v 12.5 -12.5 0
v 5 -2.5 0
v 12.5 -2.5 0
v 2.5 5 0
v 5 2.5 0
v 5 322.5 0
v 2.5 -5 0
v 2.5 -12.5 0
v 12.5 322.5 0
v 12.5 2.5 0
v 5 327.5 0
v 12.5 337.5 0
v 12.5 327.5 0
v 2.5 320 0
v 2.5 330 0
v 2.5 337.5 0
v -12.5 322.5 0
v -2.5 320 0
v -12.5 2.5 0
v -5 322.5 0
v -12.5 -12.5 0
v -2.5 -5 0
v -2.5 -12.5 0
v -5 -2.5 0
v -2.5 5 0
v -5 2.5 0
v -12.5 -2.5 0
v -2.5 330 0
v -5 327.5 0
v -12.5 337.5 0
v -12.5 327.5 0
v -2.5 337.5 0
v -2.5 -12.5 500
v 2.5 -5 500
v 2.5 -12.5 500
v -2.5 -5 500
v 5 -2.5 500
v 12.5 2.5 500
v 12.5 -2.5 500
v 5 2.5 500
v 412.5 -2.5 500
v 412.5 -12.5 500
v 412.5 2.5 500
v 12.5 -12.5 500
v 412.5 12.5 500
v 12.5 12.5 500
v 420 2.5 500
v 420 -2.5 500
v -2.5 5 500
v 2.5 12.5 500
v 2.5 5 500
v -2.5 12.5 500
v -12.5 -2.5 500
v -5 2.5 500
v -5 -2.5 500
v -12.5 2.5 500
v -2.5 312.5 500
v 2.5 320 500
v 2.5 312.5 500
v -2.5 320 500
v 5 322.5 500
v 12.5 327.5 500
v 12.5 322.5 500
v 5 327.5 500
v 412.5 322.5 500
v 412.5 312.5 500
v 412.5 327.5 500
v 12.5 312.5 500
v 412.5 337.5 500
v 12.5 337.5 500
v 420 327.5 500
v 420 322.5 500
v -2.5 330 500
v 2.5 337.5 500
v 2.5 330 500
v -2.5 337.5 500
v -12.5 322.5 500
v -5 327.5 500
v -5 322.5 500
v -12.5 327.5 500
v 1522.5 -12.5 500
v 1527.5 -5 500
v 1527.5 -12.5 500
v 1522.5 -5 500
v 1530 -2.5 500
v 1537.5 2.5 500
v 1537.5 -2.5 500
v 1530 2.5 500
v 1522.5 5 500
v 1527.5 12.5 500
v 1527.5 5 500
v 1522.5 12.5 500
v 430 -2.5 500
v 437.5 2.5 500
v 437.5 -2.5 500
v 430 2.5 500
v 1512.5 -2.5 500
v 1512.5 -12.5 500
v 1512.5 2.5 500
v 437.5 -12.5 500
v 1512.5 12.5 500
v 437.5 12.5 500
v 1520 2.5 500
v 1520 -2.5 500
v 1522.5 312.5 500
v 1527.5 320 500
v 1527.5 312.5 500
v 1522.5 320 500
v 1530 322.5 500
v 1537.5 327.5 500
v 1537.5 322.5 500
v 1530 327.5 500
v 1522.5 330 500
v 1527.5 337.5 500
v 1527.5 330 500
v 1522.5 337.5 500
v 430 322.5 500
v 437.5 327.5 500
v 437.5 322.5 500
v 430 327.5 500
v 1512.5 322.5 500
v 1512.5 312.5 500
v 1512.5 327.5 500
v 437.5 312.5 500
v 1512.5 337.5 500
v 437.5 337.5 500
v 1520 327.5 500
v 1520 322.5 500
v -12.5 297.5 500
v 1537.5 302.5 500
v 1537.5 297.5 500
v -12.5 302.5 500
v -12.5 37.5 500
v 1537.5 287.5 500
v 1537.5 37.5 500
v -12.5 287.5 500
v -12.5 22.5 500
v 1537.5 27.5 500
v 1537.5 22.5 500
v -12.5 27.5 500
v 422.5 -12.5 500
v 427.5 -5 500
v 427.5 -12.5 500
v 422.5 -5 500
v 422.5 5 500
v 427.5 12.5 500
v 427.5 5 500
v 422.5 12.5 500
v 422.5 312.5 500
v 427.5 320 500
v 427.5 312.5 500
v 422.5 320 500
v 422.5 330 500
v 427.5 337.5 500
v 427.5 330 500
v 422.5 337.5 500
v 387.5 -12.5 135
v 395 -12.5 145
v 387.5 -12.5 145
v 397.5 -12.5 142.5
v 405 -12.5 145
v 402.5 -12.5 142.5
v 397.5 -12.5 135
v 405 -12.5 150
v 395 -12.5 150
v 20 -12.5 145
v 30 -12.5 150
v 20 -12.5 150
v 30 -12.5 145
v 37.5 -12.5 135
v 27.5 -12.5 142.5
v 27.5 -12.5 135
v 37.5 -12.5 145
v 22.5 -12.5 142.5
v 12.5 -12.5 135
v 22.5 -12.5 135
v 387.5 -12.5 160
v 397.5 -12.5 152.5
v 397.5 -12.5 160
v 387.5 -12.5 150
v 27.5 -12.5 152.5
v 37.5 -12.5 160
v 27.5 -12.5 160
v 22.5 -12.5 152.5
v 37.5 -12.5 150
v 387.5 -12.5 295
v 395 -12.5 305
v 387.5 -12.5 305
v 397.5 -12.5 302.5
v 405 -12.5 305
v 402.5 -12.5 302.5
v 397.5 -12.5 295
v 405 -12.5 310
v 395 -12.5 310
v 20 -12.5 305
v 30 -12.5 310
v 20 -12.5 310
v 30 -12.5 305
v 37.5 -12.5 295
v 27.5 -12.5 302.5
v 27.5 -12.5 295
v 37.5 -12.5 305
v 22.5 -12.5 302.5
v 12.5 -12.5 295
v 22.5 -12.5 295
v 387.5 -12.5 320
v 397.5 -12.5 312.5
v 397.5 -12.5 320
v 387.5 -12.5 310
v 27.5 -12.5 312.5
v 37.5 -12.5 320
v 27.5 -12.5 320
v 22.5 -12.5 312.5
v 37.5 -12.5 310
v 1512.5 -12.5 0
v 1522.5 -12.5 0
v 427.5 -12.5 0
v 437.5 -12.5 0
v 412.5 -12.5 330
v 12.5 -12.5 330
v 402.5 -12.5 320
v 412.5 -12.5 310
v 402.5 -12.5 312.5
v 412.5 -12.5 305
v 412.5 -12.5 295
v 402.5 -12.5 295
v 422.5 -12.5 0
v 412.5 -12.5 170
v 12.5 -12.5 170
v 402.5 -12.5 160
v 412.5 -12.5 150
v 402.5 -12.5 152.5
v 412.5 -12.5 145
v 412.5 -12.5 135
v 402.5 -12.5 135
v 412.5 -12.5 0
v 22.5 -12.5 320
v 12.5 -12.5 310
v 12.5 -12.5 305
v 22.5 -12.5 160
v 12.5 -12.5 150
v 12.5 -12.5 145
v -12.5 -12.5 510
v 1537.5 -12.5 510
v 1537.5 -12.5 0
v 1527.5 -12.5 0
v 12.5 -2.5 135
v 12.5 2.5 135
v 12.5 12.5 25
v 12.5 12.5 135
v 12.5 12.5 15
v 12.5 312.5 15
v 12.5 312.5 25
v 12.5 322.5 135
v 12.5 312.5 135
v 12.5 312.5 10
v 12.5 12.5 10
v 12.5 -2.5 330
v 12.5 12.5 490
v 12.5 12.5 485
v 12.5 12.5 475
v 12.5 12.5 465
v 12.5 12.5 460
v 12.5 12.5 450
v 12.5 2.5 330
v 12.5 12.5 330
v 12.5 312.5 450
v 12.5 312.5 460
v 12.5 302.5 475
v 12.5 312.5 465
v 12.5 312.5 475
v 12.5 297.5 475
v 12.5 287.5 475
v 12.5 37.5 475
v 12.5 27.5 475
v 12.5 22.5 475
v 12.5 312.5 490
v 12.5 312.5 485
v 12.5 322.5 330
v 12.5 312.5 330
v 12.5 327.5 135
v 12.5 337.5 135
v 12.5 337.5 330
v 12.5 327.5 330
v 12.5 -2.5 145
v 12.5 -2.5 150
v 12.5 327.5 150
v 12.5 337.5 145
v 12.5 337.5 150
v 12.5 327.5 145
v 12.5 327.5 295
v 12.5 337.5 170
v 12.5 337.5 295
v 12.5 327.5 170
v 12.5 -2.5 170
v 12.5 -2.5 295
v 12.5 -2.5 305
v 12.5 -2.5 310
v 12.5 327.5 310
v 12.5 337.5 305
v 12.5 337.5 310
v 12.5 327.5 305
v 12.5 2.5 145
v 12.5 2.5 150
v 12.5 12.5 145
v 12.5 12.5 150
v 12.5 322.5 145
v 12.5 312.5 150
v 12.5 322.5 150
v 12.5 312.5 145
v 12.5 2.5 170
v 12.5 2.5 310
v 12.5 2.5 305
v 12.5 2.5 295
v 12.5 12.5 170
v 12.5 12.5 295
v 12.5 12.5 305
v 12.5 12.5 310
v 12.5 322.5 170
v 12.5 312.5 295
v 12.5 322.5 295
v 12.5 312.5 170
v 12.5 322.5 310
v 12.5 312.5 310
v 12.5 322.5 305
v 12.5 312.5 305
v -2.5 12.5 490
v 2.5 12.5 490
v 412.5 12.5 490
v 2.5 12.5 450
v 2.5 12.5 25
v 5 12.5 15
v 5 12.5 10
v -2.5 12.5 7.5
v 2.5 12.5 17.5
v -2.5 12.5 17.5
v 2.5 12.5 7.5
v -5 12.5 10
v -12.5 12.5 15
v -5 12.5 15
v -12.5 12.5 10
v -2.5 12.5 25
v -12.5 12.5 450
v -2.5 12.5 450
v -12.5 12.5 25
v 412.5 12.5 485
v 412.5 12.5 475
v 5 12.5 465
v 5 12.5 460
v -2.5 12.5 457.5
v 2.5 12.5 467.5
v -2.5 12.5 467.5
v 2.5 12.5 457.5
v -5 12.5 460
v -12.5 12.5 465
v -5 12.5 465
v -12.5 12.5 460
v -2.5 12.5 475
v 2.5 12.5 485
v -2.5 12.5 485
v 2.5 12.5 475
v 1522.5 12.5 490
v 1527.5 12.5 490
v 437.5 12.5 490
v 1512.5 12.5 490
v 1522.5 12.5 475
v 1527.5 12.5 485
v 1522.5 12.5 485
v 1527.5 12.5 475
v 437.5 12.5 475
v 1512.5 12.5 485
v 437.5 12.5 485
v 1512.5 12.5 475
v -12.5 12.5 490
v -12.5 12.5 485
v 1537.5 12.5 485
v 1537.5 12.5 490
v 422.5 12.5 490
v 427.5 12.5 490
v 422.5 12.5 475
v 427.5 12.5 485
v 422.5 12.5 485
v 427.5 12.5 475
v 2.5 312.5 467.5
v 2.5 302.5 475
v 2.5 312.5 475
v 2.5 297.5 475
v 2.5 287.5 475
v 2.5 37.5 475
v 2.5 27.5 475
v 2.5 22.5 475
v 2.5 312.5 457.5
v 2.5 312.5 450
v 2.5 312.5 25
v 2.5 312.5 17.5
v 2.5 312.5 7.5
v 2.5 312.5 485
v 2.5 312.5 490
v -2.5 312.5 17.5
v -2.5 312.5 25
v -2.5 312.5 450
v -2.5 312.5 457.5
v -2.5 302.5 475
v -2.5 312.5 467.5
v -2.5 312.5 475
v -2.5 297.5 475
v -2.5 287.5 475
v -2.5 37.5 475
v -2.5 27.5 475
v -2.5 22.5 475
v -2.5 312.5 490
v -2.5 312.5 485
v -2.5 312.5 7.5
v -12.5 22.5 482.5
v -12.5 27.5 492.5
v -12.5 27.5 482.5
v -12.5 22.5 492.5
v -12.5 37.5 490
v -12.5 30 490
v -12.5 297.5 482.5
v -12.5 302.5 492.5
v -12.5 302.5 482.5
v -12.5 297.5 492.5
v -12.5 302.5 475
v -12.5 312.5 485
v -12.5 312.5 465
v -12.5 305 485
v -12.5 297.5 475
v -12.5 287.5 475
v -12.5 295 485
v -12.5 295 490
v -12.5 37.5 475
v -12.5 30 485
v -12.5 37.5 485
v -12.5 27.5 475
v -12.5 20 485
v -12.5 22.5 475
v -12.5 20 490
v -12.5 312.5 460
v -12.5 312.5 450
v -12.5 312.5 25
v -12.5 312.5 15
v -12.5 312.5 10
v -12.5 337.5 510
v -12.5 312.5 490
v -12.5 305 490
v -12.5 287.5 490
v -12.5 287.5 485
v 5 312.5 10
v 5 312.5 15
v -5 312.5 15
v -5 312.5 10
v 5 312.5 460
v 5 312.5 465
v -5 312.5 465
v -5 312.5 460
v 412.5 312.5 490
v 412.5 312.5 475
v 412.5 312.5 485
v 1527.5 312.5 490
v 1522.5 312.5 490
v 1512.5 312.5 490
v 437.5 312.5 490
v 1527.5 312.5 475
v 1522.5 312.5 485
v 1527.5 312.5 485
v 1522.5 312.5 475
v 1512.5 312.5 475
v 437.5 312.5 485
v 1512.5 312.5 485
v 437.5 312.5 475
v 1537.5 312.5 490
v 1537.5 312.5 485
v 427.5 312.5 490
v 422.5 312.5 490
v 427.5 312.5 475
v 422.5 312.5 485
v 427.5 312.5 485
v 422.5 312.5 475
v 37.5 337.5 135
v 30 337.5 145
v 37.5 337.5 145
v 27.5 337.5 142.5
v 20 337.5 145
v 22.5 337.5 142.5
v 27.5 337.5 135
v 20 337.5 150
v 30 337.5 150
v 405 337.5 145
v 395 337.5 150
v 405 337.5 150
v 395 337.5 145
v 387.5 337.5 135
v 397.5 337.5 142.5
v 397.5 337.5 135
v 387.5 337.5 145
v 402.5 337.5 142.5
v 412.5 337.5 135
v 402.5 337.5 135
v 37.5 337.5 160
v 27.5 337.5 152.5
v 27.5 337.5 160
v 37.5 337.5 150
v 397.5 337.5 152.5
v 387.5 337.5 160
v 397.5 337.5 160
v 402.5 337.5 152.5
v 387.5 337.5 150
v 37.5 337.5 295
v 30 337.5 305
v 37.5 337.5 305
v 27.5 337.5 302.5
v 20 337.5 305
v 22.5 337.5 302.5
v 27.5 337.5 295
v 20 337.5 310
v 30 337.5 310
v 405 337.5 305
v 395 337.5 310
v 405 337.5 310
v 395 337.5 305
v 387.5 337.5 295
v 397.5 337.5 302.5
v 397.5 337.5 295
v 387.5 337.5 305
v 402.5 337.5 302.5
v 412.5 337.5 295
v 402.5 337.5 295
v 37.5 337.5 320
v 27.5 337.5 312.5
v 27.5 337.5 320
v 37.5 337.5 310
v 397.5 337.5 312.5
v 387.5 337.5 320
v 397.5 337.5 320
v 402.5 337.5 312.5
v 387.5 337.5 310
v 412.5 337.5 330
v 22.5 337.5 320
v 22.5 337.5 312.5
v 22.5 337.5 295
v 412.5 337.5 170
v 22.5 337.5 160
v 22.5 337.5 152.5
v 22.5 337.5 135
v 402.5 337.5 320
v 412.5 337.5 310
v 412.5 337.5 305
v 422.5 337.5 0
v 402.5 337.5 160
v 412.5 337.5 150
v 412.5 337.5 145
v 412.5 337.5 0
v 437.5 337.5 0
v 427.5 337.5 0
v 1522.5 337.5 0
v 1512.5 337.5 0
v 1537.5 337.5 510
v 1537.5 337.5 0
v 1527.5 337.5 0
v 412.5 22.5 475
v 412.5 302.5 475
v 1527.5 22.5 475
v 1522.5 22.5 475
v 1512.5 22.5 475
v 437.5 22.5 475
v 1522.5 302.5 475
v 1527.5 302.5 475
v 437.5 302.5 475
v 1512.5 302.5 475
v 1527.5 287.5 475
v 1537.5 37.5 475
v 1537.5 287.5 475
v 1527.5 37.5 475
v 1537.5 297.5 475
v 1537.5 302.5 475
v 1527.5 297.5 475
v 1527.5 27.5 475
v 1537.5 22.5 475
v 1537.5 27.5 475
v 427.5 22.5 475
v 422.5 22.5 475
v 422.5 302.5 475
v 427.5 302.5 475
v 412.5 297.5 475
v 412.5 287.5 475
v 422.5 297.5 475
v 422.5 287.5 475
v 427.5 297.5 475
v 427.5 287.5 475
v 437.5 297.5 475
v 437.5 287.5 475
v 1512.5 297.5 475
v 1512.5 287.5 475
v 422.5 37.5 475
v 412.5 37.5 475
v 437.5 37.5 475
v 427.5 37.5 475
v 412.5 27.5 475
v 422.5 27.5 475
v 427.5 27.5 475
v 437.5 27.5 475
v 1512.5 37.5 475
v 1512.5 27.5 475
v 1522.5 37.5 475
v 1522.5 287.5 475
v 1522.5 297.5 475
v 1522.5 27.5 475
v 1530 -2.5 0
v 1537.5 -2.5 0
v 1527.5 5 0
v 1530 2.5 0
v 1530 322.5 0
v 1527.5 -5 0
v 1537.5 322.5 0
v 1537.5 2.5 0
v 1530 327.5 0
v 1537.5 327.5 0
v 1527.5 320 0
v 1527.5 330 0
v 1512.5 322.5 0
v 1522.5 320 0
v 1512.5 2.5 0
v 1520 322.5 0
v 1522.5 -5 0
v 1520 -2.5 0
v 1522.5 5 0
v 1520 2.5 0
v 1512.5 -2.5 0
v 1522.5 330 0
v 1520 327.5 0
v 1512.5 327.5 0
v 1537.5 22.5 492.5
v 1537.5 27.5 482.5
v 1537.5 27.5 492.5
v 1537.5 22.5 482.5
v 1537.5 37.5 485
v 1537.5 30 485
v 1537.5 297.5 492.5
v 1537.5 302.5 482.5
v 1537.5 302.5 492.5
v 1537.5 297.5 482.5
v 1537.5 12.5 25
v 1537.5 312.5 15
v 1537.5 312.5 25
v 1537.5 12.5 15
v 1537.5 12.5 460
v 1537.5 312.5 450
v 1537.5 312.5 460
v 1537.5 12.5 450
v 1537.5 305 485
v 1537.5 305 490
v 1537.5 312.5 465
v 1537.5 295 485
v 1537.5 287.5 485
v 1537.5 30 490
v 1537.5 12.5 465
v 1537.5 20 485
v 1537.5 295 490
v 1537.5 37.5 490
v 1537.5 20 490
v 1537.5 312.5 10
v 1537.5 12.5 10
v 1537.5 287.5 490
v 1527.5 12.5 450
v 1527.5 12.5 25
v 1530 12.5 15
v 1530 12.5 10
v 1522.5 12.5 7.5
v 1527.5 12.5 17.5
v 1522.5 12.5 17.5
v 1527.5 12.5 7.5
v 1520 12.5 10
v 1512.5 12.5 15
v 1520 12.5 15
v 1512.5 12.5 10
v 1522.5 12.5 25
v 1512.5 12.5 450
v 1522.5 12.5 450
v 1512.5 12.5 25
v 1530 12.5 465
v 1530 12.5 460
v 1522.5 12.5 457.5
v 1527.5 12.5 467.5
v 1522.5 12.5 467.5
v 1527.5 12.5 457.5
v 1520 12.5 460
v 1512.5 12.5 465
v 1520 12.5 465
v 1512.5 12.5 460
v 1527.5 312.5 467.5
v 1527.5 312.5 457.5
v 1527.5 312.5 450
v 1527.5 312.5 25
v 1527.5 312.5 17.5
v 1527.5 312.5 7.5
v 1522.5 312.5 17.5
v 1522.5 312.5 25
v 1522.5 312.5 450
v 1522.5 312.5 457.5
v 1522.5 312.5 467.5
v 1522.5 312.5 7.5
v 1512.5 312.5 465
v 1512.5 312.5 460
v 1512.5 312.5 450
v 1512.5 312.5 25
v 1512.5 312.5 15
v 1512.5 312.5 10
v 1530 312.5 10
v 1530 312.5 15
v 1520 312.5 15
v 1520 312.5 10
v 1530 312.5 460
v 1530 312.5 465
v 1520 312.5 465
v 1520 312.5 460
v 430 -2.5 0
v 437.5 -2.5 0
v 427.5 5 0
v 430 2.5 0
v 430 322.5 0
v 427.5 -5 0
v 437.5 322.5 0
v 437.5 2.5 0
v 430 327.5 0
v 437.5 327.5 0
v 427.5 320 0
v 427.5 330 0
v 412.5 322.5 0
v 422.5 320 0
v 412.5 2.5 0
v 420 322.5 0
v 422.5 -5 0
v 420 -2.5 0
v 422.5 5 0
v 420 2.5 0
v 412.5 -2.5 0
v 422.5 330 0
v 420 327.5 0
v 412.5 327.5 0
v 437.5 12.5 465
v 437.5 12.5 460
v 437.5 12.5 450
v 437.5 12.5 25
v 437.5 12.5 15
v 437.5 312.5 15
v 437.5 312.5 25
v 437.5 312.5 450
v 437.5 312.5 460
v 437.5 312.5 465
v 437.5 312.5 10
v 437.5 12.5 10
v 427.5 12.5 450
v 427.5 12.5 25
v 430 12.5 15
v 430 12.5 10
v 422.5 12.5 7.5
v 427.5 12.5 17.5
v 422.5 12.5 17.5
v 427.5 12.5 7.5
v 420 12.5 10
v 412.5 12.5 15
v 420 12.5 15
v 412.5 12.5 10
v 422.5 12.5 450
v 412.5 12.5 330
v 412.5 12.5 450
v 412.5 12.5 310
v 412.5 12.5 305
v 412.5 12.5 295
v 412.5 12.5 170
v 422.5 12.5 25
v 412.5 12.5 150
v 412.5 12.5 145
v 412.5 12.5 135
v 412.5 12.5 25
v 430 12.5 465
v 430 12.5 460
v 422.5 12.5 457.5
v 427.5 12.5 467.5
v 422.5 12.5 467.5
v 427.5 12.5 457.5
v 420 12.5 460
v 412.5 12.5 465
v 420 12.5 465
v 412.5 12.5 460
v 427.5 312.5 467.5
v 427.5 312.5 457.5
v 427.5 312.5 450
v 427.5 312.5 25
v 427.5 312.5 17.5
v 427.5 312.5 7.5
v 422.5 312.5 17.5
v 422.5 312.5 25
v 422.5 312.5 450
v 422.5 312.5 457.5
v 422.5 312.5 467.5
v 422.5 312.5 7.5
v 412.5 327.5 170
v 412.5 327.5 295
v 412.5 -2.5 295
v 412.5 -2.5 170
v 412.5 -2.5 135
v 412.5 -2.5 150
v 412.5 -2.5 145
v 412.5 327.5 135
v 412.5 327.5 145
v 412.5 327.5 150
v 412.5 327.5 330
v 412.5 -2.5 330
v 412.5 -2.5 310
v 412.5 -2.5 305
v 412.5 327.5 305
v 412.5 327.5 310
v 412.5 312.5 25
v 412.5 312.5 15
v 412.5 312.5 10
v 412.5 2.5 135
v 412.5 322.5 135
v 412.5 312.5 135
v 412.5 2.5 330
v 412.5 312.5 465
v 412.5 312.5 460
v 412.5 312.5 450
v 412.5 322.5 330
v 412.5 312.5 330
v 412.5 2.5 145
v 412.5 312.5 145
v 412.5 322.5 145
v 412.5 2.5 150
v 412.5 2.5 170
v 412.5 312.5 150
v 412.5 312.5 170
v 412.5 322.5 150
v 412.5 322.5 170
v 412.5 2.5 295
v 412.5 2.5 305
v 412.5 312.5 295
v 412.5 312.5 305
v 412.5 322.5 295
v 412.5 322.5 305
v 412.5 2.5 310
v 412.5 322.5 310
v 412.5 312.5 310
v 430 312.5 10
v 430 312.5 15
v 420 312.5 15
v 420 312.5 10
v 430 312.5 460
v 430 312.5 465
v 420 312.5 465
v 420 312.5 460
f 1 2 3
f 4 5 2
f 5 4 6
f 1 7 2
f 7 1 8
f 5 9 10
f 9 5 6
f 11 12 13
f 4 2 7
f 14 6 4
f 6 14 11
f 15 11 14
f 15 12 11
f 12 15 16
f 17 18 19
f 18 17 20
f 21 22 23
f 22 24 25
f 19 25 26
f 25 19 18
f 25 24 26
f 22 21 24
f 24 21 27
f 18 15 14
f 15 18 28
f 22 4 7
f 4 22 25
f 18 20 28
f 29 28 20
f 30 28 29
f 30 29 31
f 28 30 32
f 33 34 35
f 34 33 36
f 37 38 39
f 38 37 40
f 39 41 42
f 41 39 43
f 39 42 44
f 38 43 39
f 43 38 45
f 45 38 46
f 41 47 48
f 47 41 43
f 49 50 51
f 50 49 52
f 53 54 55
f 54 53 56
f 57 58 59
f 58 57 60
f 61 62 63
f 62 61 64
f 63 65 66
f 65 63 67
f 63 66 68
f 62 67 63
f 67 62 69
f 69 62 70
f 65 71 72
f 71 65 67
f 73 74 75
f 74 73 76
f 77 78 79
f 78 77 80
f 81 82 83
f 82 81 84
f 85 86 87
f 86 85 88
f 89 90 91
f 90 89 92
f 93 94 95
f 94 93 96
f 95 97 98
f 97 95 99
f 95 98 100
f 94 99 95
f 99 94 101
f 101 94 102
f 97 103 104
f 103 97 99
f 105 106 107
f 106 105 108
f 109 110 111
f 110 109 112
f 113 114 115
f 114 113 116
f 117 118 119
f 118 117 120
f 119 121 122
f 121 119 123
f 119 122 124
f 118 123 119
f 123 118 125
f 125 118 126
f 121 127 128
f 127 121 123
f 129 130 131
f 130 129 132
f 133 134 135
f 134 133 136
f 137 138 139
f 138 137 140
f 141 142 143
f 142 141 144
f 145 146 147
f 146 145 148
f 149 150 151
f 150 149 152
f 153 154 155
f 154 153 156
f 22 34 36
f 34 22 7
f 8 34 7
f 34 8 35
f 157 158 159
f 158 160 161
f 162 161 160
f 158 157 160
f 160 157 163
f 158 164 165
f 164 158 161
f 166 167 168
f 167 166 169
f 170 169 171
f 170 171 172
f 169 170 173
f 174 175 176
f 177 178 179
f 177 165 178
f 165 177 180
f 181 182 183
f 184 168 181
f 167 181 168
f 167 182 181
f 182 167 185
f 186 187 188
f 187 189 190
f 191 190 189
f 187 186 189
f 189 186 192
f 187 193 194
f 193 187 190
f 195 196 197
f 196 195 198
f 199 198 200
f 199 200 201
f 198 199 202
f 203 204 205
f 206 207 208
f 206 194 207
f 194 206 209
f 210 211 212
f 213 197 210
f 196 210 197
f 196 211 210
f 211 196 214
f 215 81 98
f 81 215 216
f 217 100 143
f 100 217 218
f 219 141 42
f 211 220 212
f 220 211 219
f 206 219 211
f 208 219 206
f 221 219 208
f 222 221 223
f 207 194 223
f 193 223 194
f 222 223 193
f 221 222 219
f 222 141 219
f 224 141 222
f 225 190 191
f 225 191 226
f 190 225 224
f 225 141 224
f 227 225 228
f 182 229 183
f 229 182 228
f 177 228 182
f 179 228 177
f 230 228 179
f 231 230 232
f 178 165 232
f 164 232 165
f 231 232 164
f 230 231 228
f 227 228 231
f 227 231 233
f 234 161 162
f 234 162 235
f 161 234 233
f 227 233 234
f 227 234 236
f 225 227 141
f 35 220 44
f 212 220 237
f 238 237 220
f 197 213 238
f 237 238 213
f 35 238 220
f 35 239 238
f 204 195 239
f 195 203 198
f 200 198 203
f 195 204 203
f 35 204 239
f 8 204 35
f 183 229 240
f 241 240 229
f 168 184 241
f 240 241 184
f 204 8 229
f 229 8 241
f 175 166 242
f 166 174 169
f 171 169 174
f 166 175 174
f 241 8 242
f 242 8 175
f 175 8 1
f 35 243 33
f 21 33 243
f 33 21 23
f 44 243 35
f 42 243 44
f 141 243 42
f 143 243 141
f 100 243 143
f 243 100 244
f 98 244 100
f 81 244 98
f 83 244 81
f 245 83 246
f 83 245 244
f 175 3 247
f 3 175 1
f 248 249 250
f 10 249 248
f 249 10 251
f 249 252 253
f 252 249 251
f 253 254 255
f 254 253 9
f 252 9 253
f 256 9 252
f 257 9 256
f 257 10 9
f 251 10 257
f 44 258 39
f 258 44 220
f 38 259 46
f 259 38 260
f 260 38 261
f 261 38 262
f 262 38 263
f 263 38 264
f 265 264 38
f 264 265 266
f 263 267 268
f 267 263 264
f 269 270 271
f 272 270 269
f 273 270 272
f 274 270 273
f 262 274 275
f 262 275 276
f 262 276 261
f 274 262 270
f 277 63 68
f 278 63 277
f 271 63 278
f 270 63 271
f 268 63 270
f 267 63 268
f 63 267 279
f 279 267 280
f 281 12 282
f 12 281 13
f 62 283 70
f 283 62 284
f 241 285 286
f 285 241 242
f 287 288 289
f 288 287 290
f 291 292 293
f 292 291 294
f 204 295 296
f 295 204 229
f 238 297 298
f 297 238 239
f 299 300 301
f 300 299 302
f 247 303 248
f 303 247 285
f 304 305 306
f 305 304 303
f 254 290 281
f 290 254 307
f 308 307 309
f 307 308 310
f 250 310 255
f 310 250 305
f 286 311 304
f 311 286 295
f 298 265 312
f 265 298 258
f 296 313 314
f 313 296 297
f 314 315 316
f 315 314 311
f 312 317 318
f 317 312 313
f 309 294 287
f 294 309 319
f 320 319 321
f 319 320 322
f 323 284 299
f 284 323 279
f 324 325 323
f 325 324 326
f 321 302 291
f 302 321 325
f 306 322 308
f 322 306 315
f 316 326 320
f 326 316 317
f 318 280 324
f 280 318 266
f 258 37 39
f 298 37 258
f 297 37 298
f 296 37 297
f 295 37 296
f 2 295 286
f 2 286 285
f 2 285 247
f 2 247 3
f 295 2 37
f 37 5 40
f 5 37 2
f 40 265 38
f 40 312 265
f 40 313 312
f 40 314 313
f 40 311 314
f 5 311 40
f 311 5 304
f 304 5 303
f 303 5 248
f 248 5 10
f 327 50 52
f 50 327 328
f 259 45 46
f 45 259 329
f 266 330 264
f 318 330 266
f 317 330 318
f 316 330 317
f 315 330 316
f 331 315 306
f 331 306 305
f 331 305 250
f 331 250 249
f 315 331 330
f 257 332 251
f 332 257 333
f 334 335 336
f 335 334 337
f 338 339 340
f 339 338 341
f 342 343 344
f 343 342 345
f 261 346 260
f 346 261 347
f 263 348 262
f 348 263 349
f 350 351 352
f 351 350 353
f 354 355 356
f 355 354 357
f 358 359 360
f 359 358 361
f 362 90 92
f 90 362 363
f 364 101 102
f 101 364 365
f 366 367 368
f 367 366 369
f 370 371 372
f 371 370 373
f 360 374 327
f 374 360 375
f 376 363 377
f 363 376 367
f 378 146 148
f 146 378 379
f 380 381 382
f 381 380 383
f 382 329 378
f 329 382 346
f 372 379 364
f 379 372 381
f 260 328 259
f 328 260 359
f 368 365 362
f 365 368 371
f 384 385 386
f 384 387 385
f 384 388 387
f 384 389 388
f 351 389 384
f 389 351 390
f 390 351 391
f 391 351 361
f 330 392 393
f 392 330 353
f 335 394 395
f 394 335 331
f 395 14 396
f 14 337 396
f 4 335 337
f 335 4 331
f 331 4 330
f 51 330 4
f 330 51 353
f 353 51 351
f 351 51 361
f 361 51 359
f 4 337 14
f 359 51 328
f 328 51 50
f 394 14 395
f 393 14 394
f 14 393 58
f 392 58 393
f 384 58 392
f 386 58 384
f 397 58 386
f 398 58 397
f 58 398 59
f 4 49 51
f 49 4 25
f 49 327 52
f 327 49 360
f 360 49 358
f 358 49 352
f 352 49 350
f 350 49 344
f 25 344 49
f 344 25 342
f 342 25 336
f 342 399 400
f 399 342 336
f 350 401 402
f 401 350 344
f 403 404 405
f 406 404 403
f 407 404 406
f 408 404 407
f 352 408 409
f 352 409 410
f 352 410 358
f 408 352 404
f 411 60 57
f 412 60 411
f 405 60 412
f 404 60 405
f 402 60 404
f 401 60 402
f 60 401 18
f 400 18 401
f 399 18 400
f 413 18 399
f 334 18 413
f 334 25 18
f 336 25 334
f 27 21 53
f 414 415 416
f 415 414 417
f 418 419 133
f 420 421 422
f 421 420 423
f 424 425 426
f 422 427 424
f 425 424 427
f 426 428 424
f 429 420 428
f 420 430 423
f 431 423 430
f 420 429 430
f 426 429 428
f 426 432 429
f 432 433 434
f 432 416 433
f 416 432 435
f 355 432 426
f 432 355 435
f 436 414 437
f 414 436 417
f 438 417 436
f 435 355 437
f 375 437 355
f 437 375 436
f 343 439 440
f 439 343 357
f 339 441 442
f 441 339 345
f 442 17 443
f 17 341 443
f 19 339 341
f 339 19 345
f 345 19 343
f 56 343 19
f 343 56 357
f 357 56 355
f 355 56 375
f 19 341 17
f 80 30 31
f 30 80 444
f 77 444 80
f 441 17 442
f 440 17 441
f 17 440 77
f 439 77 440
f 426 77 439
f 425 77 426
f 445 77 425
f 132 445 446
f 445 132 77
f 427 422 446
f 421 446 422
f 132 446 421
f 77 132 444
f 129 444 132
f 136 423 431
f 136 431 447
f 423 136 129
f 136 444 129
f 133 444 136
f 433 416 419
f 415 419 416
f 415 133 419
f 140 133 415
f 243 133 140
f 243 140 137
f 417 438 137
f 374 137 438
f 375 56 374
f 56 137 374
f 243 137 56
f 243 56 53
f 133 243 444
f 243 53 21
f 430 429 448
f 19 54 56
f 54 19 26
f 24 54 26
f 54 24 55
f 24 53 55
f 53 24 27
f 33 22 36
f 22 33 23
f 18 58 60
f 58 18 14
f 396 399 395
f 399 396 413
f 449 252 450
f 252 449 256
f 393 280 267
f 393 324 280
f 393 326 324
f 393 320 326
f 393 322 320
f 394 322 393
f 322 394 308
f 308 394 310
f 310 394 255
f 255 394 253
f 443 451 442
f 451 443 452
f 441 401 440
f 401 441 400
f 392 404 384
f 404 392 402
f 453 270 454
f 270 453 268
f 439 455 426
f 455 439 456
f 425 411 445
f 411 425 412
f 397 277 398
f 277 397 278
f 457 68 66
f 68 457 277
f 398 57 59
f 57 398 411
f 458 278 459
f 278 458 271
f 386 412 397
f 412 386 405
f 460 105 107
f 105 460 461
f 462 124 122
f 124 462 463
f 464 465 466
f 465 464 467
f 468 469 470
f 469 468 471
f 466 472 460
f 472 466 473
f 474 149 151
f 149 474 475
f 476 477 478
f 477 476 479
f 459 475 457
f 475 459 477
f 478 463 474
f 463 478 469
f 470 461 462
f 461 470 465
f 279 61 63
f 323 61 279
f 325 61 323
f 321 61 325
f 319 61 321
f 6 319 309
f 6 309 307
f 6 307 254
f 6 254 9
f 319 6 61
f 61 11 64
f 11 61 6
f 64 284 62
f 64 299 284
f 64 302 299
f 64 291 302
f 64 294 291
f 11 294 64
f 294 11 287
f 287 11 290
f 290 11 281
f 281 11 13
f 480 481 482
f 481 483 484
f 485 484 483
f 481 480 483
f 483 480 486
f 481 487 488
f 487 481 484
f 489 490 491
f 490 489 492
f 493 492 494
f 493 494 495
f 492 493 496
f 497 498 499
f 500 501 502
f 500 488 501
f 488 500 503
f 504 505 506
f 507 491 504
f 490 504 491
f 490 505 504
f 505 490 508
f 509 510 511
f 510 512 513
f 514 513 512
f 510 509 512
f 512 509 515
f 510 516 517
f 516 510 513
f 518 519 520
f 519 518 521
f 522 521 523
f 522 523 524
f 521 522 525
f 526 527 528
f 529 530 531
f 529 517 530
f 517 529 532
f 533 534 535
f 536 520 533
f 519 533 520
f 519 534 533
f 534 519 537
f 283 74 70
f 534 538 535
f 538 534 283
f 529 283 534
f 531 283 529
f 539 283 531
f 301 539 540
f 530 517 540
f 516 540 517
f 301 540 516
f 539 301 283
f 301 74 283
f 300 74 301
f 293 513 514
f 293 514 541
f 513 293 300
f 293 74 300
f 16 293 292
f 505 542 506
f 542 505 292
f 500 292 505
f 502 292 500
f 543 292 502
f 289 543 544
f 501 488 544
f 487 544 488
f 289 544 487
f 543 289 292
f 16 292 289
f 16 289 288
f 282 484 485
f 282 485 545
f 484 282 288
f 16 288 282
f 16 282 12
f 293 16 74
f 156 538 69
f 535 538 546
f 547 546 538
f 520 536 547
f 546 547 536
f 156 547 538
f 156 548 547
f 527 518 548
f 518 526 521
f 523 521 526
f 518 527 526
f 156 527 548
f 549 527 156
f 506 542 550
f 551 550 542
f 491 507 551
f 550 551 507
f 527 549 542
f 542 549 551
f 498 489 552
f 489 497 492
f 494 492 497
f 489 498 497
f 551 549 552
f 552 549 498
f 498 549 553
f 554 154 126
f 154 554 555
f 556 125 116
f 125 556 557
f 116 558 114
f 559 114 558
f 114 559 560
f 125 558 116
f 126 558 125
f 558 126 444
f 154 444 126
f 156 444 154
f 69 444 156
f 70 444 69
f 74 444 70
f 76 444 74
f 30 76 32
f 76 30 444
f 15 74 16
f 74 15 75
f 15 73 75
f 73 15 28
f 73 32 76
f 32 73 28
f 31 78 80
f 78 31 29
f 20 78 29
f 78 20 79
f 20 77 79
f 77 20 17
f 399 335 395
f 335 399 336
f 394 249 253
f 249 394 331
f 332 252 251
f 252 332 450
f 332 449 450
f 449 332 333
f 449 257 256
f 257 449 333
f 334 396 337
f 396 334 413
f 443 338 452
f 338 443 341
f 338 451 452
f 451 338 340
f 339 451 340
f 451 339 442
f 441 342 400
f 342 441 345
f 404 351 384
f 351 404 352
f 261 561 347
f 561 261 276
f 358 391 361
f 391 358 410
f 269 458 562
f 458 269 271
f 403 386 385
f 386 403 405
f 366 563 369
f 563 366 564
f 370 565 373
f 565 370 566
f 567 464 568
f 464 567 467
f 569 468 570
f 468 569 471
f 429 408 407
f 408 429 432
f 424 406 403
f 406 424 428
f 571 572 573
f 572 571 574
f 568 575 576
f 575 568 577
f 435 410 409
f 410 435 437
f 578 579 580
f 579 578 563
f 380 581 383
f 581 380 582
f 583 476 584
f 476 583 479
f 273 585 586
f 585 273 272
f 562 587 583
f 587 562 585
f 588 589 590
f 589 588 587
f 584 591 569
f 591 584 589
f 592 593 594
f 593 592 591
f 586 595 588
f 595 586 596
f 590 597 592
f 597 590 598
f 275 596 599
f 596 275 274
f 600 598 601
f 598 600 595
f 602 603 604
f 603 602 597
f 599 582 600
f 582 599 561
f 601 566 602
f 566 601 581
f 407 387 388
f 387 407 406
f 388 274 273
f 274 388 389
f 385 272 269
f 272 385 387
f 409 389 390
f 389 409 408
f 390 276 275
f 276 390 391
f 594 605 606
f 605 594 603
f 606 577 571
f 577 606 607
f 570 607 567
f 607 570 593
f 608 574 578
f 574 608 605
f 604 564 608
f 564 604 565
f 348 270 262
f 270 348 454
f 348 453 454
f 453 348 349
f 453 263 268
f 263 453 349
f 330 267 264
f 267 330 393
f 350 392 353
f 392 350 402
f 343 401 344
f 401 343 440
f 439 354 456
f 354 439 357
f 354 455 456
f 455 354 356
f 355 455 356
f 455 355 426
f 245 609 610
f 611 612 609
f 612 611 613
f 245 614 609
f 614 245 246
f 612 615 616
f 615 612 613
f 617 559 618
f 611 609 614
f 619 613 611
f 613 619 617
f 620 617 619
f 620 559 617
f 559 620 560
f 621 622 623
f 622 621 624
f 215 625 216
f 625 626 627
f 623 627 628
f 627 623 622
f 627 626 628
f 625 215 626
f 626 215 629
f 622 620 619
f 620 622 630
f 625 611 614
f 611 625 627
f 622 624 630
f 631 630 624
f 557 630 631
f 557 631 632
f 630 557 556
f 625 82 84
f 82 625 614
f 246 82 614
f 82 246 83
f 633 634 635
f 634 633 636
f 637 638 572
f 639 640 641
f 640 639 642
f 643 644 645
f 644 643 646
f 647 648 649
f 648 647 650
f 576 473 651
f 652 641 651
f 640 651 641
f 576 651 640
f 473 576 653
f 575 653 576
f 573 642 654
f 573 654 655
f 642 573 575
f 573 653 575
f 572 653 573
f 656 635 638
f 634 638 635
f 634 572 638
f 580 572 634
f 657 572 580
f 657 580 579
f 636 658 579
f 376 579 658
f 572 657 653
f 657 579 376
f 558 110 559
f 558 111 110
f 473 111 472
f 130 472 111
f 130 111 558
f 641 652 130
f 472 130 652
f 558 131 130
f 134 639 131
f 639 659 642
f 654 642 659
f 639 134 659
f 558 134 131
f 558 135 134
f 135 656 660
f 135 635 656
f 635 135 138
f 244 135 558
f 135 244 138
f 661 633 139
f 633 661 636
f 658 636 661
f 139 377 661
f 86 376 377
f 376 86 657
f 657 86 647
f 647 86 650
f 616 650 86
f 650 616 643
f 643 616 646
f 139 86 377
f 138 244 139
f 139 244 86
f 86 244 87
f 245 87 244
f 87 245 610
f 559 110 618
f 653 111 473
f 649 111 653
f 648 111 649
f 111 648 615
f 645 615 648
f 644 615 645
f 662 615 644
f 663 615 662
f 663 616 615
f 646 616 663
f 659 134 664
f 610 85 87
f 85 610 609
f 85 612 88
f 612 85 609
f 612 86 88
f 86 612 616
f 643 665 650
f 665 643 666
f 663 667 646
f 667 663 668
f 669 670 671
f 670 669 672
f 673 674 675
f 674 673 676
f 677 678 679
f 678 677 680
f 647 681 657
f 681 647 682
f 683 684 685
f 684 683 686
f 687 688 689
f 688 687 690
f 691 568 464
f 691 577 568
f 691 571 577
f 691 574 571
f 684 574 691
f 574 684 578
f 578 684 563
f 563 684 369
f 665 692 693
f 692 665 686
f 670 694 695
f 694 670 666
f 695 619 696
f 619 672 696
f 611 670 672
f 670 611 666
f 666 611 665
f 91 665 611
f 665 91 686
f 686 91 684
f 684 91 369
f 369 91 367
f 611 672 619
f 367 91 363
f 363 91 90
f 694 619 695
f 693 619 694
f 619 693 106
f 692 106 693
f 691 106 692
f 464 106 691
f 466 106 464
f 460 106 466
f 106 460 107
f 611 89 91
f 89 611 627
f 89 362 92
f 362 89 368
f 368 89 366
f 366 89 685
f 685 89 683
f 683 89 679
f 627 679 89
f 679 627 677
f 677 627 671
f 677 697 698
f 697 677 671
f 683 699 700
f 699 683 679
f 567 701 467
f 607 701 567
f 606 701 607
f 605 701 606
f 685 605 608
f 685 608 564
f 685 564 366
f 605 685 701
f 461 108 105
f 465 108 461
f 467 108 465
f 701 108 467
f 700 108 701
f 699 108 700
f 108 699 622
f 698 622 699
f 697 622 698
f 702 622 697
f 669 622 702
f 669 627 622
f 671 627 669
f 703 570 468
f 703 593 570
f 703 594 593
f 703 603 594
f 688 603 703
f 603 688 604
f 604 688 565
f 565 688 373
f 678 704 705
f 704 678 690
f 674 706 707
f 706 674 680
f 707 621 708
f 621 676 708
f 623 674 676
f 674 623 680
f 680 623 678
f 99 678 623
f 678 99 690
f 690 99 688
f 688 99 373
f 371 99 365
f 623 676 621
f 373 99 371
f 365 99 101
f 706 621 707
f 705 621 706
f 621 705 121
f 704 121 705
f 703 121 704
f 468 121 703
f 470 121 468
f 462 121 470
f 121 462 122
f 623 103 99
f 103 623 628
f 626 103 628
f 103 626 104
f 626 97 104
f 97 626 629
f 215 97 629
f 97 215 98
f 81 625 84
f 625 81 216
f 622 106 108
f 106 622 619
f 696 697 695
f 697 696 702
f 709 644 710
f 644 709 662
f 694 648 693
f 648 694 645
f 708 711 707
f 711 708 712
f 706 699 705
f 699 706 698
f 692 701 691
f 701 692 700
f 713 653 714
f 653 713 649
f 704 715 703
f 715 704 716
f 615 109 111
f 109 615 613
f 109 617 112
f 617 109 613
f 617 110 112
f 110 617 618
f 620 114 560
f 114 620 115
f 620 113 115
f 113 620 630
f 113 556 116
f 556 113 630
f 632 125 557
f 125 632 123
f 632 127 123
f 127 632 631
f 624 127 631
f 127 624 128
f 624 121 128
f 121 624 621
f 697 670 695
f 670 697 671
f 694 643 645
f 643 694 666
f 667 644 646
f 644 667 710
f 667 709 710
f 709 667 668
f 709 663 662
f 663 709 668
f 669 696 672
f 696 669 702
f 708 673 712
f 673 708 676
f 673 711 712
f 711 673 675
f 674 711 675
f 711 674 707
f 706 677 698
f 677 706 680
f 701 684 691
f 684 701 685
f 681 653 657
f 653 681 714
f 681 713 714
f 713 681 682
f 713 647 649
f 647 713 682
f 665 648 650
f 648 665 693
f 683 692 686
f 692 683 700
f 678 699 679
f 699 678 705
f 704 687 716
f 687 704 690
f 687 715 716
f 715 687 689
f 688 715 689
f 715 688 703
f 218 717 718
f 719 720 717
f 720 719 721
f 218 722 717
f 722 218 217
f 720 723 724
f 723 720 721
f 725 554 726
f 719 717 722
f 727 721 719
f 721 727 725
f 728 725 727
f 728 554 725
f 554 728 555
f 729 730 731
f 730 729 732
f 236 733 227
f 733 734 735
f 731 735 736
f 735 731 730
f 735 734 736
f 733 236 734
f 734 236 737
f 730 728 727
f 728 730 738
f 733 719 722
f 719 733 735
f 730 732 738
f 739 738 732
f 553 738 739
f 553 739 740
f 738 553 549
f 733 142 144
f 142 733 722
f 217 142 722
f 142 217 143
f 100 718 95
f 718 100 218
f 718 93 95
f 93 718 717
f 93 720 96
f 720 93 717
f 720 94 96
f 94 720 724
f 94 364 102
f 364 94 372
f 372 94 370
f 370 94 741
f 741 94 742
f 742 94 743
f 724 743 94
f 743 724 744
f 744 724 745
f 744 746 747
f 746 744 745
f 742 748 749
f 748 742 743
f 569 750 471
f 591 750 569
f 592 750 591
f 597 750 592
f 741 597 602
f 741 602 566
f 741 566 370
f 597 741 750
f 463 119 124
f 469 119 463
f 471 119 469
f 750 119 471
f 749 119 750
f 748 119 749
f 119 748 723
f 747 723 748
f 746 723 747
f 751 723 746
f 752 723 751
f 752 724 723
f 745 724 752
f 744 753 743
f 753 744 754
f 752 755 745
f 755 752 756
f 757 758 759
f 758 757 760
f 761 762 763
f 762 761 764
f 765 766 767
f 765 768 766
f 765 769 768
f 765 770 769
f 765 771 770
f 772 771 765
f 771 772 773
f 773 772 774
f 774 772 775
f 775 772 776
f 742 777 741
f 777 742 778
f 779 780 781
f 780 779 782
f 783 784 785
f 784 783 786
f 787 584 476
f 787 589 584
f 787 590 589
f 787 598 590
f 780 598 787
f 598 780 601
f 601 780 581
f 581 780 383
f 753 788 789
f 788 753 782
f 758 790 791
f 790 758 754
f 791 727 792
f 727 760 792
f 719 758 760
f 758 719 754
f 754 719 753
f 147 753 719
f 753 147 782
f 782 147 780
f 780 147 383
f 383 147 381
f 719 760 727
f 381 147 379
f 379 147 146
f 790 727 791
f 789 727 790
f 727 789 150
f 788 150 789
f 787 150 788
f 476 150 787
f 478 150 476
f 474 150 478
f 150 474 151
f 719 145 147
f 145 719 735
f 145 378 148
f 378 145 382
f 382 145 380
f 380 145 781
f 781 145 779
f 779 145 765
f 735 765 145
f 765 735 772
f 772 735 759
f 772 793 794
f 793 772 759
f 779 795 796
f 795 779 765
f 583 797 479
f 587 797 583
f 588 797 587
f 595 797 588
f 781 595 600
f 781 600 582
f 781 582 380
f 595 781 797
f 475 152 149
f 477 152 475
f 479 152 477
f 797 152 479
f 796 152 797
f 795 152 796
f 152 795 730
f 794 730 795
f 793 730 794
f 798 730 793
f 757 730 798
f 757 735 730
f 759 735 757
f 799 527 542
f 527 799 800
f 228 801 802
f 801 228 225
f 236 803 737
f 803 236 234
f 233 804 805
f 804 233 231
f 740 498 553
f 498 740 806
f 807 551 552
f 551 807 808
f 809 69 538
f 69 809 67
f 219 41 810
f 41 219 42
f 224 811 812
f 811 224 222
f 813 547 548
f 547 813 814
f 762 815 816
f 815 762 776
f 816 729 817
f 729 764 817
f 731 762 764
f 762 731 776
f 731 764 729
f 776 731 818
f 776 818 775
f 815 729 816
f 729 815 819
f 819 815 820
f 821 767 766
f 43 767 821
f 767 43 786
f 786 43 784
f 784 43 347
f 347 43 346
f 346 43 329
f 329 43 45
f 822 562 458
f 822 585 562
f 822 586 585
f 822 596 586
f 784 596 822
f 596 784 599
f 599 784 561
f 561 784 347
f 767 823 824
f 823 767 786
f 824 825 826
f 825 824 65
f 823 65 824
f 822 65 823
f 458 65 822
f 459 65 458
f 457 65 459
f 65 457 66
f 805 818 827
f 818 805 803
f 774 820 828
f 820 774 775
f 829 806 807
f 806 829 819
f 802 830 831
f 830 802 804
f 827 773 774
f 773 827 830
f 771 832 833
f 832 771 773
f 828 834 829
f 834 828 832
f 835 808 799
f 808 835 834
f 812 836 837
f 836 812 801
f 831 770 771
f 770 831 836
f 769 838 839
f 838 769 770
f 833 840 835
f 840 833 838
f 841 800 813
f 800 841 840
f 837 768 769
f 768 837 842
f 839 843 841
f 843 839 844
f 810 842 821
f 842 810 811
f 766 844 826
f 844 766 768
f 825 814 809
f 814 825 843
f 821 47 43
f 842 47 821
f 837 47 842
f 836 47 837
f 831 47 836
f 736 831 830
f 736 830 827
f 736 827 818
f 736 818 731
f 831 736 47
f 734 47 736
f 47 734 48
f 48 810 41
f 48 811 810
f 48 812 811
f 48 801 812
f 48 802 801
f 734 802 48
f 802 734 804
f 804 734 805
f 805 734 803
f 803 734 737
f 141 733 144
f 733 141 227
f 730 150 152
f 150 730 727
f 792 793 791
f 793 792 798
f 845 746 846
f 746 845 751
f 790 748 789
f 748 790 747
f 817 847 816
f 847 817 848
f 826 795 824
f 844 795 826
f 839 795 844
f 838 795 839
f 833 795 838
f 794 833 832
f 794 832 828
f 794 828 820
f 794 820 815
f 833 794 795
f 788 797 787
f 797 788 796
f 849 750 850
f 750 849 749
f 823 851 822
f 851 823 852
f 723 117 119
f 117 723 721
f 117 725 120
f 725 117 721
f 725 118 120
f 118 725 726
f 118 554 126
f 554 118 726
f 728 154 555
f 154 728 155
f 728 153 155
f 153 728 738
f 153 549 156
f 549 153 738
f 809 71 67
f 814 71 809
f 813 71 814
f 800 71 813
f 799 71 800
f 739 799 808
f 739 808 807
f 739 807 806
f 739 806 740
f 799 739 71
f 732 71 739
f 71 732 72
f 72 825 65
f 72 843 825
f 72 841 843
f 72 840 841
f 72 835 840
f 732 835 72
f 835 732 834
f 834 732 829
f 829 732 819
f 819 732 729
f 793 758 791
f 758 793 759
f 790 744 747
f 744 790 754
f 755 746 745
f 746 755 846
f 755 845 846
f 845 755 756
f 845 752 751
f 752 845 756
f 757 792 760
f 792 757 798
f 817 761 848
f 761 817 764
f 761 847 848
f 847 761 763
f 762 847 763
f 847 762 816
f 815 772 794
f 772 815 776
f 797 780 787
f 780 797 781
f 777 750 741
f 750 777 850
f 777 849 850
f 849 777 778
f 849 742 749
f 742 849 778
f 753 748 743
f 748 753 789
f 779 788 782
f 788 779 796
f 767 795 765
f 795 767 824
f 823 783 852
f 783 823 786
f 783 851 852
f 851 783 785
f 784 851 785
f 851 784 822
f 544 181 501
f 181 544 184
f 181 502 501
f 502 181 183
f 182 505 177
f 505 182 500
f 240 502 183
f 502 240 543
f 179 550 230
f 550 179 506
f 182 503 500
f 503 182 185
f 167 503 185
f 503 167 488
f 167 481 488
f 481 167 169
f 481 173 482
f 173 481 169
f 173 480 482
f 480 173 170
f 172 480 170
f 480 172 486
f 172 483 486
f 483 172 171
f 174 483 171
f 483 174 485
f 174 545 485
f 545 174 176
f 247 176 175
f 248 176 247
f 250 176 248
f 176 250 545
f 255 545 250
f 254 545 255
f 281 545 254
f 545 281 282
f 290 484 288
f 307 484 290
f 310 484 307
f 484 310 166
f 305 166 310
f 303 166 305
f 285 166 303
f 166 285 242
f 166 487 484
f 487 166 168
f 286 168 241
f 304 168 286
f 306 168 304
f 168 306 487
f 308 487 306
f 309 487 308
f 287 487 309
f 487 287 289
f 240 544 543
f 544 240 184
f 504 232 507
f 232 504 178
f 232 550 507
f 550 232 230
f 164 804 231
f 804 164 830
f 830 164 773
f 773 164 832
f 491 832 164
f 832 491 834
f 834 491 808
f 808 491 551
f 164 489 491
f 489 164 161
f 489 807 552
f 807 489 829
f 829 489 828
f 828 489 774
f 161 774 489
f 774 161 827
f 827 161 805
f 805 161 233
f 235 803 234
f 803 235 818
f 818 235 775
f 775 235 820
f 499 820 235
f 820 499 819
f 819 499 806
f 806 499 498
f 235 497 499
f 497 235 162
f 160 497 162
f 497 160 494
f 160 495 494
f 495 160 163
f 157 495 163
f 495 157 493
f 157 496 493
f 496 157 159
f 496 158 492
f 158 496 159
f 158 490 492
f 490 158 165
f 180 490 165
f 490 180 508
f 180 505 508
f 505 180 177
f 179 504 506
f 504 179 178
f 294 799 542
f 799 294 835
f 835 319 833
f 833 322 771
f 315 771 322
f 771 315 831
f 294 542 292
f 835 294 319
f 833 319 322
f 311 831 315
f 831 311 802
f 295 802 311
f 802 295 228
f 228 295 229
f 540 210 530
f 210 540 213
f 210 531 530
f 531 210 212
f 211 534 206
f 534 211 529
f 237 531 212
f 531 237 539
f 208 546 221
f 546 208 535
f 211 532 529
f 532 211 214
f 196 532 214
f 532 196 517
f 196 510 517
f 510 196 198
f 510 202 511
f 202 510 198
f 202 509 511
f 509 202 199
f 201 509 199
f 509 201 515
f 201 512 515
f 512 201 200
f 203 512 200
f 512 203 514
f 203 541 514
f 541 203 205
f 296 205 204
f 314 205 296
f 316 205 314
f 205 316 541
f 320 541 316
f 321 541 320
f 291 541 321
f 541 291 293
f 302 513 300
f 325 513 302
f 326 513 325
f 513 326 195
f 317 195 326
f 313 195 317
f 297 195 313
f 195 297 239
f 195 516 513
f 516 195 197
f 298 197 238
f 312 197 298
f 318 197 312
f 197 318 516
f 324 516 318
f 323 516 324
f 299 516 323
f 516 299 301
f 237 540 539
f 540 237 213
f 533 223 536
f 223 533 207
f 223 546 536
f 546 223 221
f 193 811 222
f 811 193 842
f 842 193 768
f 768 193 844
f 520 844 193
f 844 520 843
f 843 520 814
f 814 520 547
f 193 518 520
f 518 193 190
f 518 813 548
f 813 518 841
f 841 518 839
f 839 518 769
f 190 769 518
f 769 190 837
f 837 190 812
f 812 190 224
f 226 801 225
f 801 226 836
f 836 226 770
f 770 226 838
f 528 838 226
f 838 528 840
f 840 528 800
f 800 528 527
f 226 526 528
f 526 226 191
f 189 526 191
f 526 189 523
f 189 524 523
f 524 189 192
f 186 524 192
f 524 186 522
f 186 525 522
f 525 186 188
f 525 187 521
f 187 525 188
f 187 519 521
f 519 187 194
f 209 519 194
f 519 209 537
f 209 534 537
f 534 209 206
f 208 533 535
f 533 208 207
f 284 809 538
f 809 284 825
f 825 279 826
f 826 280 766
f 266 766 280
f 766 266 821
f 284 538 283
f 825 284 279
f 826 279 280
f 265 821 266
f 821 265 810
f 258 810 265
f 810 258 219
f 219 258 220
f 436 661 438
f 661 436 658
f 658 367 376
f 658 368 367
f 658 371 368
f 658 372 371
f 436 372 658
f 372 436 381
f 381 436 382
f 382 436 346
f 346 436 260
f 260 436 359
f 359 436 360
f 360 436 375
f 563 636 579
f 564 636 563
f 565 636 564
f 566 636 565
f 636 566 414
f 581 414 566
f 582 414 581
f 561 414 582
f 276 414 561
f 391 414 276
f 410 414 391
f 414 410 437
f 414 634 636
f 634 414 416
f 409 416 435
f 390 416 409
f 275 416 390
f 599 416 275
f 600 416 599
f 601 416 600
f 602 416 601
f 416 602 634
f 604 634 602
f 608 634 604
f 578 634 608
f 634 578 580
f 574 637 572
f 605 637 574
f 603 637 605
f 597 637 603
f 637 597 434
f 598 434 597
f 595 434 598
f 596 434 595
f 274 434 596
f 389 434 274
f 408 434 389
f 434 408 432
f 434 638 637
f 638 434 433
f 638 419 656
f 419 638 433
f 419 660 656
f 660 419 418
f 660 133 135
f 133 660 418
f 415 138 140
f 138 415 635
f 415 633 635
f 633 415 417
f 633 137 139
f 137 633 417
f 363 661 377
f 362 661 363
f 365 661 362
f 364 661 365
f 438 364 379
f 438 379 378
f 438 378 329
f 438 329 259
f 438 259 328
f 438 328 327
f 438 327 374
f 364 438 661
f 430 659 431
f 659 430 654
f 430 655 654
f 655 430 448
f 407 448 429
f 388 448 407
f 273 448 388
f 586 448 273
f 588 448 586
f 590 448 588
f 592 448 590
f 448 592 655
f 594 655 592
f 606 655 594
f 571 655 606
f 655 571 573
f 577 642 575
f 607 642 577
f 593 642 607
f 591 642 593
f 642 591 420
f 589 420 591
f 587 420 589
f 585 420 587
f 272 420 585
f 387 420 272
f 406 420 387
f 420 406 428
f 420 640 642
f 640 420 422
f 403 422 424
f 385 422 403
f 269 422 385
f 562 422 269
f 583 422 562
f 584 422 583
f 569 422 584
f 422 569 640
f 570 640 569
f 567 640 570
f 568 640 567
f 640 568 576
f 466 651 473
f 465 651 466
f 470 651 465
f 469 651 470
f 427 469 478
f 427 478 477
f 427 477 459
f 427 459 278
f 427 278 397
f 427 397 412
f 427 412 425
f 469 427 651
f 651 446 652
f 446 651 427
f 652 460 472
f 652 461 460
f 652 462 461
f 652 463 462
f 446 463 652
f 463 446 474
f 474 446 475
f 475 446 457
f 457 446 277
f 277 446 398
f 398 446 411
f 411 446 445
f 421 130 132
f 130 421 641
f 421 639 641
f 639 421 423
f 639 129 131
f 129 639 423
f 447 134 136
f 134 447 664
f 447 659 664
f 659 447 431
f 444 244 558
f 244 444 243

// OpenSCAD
mm = 1;
cm = 10 * mm;

u = 25 * mm;

frame_height = 50 * cm;
frame_depth = 35 * cm;
frame_width = 155 * cm;

cubby_width = 40 * cm;

panel_thickness = 1 * cm;

module extrusion_base()
{
    // Very basic model representing T-slot extrusion.
    polygon([
        [ -0.5 * u, -0.5 * u ],

        [ -0.5 * u, -0.1 * u ], [ -0.2 * u, -0.1 * u ], [ -0.2 * u, 0.1 * u ],  [ -0.5 * u, 0.1 * u ],

        [ -0.5 * u, 0.5 * u ],

        [ -0.1 * u, 0.5 * u ],  [ -0.1 * u, 0.2 * u ],  [ 0.1 * u, 0.2 * u ],   [ 0.1 * u, 0.5 * u ],

        [ 0.5 * u, 0.5 * u ],

        [ 0.5 * u, 0.1 * u ],   [ 0.2 * u, 0.1 * u ],   [ 0.2 * u, -0.1 * u ],  [ 0.5 * u, -0.1 * u ],

        [ 0.5 * u, -0.5 * u ],

        [ 0.1 * u, -0.5 * u ],  [ 0.1 * u, -0.2 * u ],  [ -0.1 * u, -0.2 * u ], [ -0.1 * u, -0.5 * u ],
    ]);
}

module extrusion(l)
{
    linear_extrude(l) extrusion_base();
}

module side()
{
    extrusion(frame_height);
    translate([ 0, frame_depth - u, 0 ]) extrusion(frame_height);
    translate([ 0, 0.5 * u, 0.5 * u ]) rotate([ -90, 0, 0 ]) extrusion(frame_depth - 2 * u);
    translate([ 0, 0.5 * u, frame_height - 1.5 * u ]) rotate([ -90, 0, 0 ]) extrusion(frame_depth - 2 * u);
}

module cubby_shelf()
{
    translate([ u, -0.5 * u, -0.5 * u ]) rotate([ -90, 0, 0 ]) extrusion(frame_depth);
    translate([ cubby_width, -0.5 * u, -0.5 * u ]) rotate([ -90, 0, 0 ]) extrusion(frame_depth);

    translate([ 0.5 * u, -0.5 * u, 0 ]) cube([ cubby_width, frame_depth, panel_thickness ]);
}

module desk_shelf()
{
    side();
    translate([ frame_width - u, 0, 0 ]) side();
    translate([ cubby_width + u, 0, 0 ]) side();
    translate([ -0.5 * u, 1 * u, frame_height - 0.5 * u ]) rotate([ 0, 90, 0 ]) extrusion(frame_width);
    translate([ -0.5 * u, frame_depth - 2 * u, frame_height - 0.5 * u ]) rotate([ 0, 90, 0 ]) extrusion(frame_width);

    translate([-0.5 * u, -0.5 * u, frame_height ]) cube([frame_width, frame_depth, panel_thickness]);

    translate([ 0, 0, 16 * cm ]) cubby_shelf();
    translate([ 0, 0, 32 * cm ]) cubby_shelf();
}

desk_shelf();
